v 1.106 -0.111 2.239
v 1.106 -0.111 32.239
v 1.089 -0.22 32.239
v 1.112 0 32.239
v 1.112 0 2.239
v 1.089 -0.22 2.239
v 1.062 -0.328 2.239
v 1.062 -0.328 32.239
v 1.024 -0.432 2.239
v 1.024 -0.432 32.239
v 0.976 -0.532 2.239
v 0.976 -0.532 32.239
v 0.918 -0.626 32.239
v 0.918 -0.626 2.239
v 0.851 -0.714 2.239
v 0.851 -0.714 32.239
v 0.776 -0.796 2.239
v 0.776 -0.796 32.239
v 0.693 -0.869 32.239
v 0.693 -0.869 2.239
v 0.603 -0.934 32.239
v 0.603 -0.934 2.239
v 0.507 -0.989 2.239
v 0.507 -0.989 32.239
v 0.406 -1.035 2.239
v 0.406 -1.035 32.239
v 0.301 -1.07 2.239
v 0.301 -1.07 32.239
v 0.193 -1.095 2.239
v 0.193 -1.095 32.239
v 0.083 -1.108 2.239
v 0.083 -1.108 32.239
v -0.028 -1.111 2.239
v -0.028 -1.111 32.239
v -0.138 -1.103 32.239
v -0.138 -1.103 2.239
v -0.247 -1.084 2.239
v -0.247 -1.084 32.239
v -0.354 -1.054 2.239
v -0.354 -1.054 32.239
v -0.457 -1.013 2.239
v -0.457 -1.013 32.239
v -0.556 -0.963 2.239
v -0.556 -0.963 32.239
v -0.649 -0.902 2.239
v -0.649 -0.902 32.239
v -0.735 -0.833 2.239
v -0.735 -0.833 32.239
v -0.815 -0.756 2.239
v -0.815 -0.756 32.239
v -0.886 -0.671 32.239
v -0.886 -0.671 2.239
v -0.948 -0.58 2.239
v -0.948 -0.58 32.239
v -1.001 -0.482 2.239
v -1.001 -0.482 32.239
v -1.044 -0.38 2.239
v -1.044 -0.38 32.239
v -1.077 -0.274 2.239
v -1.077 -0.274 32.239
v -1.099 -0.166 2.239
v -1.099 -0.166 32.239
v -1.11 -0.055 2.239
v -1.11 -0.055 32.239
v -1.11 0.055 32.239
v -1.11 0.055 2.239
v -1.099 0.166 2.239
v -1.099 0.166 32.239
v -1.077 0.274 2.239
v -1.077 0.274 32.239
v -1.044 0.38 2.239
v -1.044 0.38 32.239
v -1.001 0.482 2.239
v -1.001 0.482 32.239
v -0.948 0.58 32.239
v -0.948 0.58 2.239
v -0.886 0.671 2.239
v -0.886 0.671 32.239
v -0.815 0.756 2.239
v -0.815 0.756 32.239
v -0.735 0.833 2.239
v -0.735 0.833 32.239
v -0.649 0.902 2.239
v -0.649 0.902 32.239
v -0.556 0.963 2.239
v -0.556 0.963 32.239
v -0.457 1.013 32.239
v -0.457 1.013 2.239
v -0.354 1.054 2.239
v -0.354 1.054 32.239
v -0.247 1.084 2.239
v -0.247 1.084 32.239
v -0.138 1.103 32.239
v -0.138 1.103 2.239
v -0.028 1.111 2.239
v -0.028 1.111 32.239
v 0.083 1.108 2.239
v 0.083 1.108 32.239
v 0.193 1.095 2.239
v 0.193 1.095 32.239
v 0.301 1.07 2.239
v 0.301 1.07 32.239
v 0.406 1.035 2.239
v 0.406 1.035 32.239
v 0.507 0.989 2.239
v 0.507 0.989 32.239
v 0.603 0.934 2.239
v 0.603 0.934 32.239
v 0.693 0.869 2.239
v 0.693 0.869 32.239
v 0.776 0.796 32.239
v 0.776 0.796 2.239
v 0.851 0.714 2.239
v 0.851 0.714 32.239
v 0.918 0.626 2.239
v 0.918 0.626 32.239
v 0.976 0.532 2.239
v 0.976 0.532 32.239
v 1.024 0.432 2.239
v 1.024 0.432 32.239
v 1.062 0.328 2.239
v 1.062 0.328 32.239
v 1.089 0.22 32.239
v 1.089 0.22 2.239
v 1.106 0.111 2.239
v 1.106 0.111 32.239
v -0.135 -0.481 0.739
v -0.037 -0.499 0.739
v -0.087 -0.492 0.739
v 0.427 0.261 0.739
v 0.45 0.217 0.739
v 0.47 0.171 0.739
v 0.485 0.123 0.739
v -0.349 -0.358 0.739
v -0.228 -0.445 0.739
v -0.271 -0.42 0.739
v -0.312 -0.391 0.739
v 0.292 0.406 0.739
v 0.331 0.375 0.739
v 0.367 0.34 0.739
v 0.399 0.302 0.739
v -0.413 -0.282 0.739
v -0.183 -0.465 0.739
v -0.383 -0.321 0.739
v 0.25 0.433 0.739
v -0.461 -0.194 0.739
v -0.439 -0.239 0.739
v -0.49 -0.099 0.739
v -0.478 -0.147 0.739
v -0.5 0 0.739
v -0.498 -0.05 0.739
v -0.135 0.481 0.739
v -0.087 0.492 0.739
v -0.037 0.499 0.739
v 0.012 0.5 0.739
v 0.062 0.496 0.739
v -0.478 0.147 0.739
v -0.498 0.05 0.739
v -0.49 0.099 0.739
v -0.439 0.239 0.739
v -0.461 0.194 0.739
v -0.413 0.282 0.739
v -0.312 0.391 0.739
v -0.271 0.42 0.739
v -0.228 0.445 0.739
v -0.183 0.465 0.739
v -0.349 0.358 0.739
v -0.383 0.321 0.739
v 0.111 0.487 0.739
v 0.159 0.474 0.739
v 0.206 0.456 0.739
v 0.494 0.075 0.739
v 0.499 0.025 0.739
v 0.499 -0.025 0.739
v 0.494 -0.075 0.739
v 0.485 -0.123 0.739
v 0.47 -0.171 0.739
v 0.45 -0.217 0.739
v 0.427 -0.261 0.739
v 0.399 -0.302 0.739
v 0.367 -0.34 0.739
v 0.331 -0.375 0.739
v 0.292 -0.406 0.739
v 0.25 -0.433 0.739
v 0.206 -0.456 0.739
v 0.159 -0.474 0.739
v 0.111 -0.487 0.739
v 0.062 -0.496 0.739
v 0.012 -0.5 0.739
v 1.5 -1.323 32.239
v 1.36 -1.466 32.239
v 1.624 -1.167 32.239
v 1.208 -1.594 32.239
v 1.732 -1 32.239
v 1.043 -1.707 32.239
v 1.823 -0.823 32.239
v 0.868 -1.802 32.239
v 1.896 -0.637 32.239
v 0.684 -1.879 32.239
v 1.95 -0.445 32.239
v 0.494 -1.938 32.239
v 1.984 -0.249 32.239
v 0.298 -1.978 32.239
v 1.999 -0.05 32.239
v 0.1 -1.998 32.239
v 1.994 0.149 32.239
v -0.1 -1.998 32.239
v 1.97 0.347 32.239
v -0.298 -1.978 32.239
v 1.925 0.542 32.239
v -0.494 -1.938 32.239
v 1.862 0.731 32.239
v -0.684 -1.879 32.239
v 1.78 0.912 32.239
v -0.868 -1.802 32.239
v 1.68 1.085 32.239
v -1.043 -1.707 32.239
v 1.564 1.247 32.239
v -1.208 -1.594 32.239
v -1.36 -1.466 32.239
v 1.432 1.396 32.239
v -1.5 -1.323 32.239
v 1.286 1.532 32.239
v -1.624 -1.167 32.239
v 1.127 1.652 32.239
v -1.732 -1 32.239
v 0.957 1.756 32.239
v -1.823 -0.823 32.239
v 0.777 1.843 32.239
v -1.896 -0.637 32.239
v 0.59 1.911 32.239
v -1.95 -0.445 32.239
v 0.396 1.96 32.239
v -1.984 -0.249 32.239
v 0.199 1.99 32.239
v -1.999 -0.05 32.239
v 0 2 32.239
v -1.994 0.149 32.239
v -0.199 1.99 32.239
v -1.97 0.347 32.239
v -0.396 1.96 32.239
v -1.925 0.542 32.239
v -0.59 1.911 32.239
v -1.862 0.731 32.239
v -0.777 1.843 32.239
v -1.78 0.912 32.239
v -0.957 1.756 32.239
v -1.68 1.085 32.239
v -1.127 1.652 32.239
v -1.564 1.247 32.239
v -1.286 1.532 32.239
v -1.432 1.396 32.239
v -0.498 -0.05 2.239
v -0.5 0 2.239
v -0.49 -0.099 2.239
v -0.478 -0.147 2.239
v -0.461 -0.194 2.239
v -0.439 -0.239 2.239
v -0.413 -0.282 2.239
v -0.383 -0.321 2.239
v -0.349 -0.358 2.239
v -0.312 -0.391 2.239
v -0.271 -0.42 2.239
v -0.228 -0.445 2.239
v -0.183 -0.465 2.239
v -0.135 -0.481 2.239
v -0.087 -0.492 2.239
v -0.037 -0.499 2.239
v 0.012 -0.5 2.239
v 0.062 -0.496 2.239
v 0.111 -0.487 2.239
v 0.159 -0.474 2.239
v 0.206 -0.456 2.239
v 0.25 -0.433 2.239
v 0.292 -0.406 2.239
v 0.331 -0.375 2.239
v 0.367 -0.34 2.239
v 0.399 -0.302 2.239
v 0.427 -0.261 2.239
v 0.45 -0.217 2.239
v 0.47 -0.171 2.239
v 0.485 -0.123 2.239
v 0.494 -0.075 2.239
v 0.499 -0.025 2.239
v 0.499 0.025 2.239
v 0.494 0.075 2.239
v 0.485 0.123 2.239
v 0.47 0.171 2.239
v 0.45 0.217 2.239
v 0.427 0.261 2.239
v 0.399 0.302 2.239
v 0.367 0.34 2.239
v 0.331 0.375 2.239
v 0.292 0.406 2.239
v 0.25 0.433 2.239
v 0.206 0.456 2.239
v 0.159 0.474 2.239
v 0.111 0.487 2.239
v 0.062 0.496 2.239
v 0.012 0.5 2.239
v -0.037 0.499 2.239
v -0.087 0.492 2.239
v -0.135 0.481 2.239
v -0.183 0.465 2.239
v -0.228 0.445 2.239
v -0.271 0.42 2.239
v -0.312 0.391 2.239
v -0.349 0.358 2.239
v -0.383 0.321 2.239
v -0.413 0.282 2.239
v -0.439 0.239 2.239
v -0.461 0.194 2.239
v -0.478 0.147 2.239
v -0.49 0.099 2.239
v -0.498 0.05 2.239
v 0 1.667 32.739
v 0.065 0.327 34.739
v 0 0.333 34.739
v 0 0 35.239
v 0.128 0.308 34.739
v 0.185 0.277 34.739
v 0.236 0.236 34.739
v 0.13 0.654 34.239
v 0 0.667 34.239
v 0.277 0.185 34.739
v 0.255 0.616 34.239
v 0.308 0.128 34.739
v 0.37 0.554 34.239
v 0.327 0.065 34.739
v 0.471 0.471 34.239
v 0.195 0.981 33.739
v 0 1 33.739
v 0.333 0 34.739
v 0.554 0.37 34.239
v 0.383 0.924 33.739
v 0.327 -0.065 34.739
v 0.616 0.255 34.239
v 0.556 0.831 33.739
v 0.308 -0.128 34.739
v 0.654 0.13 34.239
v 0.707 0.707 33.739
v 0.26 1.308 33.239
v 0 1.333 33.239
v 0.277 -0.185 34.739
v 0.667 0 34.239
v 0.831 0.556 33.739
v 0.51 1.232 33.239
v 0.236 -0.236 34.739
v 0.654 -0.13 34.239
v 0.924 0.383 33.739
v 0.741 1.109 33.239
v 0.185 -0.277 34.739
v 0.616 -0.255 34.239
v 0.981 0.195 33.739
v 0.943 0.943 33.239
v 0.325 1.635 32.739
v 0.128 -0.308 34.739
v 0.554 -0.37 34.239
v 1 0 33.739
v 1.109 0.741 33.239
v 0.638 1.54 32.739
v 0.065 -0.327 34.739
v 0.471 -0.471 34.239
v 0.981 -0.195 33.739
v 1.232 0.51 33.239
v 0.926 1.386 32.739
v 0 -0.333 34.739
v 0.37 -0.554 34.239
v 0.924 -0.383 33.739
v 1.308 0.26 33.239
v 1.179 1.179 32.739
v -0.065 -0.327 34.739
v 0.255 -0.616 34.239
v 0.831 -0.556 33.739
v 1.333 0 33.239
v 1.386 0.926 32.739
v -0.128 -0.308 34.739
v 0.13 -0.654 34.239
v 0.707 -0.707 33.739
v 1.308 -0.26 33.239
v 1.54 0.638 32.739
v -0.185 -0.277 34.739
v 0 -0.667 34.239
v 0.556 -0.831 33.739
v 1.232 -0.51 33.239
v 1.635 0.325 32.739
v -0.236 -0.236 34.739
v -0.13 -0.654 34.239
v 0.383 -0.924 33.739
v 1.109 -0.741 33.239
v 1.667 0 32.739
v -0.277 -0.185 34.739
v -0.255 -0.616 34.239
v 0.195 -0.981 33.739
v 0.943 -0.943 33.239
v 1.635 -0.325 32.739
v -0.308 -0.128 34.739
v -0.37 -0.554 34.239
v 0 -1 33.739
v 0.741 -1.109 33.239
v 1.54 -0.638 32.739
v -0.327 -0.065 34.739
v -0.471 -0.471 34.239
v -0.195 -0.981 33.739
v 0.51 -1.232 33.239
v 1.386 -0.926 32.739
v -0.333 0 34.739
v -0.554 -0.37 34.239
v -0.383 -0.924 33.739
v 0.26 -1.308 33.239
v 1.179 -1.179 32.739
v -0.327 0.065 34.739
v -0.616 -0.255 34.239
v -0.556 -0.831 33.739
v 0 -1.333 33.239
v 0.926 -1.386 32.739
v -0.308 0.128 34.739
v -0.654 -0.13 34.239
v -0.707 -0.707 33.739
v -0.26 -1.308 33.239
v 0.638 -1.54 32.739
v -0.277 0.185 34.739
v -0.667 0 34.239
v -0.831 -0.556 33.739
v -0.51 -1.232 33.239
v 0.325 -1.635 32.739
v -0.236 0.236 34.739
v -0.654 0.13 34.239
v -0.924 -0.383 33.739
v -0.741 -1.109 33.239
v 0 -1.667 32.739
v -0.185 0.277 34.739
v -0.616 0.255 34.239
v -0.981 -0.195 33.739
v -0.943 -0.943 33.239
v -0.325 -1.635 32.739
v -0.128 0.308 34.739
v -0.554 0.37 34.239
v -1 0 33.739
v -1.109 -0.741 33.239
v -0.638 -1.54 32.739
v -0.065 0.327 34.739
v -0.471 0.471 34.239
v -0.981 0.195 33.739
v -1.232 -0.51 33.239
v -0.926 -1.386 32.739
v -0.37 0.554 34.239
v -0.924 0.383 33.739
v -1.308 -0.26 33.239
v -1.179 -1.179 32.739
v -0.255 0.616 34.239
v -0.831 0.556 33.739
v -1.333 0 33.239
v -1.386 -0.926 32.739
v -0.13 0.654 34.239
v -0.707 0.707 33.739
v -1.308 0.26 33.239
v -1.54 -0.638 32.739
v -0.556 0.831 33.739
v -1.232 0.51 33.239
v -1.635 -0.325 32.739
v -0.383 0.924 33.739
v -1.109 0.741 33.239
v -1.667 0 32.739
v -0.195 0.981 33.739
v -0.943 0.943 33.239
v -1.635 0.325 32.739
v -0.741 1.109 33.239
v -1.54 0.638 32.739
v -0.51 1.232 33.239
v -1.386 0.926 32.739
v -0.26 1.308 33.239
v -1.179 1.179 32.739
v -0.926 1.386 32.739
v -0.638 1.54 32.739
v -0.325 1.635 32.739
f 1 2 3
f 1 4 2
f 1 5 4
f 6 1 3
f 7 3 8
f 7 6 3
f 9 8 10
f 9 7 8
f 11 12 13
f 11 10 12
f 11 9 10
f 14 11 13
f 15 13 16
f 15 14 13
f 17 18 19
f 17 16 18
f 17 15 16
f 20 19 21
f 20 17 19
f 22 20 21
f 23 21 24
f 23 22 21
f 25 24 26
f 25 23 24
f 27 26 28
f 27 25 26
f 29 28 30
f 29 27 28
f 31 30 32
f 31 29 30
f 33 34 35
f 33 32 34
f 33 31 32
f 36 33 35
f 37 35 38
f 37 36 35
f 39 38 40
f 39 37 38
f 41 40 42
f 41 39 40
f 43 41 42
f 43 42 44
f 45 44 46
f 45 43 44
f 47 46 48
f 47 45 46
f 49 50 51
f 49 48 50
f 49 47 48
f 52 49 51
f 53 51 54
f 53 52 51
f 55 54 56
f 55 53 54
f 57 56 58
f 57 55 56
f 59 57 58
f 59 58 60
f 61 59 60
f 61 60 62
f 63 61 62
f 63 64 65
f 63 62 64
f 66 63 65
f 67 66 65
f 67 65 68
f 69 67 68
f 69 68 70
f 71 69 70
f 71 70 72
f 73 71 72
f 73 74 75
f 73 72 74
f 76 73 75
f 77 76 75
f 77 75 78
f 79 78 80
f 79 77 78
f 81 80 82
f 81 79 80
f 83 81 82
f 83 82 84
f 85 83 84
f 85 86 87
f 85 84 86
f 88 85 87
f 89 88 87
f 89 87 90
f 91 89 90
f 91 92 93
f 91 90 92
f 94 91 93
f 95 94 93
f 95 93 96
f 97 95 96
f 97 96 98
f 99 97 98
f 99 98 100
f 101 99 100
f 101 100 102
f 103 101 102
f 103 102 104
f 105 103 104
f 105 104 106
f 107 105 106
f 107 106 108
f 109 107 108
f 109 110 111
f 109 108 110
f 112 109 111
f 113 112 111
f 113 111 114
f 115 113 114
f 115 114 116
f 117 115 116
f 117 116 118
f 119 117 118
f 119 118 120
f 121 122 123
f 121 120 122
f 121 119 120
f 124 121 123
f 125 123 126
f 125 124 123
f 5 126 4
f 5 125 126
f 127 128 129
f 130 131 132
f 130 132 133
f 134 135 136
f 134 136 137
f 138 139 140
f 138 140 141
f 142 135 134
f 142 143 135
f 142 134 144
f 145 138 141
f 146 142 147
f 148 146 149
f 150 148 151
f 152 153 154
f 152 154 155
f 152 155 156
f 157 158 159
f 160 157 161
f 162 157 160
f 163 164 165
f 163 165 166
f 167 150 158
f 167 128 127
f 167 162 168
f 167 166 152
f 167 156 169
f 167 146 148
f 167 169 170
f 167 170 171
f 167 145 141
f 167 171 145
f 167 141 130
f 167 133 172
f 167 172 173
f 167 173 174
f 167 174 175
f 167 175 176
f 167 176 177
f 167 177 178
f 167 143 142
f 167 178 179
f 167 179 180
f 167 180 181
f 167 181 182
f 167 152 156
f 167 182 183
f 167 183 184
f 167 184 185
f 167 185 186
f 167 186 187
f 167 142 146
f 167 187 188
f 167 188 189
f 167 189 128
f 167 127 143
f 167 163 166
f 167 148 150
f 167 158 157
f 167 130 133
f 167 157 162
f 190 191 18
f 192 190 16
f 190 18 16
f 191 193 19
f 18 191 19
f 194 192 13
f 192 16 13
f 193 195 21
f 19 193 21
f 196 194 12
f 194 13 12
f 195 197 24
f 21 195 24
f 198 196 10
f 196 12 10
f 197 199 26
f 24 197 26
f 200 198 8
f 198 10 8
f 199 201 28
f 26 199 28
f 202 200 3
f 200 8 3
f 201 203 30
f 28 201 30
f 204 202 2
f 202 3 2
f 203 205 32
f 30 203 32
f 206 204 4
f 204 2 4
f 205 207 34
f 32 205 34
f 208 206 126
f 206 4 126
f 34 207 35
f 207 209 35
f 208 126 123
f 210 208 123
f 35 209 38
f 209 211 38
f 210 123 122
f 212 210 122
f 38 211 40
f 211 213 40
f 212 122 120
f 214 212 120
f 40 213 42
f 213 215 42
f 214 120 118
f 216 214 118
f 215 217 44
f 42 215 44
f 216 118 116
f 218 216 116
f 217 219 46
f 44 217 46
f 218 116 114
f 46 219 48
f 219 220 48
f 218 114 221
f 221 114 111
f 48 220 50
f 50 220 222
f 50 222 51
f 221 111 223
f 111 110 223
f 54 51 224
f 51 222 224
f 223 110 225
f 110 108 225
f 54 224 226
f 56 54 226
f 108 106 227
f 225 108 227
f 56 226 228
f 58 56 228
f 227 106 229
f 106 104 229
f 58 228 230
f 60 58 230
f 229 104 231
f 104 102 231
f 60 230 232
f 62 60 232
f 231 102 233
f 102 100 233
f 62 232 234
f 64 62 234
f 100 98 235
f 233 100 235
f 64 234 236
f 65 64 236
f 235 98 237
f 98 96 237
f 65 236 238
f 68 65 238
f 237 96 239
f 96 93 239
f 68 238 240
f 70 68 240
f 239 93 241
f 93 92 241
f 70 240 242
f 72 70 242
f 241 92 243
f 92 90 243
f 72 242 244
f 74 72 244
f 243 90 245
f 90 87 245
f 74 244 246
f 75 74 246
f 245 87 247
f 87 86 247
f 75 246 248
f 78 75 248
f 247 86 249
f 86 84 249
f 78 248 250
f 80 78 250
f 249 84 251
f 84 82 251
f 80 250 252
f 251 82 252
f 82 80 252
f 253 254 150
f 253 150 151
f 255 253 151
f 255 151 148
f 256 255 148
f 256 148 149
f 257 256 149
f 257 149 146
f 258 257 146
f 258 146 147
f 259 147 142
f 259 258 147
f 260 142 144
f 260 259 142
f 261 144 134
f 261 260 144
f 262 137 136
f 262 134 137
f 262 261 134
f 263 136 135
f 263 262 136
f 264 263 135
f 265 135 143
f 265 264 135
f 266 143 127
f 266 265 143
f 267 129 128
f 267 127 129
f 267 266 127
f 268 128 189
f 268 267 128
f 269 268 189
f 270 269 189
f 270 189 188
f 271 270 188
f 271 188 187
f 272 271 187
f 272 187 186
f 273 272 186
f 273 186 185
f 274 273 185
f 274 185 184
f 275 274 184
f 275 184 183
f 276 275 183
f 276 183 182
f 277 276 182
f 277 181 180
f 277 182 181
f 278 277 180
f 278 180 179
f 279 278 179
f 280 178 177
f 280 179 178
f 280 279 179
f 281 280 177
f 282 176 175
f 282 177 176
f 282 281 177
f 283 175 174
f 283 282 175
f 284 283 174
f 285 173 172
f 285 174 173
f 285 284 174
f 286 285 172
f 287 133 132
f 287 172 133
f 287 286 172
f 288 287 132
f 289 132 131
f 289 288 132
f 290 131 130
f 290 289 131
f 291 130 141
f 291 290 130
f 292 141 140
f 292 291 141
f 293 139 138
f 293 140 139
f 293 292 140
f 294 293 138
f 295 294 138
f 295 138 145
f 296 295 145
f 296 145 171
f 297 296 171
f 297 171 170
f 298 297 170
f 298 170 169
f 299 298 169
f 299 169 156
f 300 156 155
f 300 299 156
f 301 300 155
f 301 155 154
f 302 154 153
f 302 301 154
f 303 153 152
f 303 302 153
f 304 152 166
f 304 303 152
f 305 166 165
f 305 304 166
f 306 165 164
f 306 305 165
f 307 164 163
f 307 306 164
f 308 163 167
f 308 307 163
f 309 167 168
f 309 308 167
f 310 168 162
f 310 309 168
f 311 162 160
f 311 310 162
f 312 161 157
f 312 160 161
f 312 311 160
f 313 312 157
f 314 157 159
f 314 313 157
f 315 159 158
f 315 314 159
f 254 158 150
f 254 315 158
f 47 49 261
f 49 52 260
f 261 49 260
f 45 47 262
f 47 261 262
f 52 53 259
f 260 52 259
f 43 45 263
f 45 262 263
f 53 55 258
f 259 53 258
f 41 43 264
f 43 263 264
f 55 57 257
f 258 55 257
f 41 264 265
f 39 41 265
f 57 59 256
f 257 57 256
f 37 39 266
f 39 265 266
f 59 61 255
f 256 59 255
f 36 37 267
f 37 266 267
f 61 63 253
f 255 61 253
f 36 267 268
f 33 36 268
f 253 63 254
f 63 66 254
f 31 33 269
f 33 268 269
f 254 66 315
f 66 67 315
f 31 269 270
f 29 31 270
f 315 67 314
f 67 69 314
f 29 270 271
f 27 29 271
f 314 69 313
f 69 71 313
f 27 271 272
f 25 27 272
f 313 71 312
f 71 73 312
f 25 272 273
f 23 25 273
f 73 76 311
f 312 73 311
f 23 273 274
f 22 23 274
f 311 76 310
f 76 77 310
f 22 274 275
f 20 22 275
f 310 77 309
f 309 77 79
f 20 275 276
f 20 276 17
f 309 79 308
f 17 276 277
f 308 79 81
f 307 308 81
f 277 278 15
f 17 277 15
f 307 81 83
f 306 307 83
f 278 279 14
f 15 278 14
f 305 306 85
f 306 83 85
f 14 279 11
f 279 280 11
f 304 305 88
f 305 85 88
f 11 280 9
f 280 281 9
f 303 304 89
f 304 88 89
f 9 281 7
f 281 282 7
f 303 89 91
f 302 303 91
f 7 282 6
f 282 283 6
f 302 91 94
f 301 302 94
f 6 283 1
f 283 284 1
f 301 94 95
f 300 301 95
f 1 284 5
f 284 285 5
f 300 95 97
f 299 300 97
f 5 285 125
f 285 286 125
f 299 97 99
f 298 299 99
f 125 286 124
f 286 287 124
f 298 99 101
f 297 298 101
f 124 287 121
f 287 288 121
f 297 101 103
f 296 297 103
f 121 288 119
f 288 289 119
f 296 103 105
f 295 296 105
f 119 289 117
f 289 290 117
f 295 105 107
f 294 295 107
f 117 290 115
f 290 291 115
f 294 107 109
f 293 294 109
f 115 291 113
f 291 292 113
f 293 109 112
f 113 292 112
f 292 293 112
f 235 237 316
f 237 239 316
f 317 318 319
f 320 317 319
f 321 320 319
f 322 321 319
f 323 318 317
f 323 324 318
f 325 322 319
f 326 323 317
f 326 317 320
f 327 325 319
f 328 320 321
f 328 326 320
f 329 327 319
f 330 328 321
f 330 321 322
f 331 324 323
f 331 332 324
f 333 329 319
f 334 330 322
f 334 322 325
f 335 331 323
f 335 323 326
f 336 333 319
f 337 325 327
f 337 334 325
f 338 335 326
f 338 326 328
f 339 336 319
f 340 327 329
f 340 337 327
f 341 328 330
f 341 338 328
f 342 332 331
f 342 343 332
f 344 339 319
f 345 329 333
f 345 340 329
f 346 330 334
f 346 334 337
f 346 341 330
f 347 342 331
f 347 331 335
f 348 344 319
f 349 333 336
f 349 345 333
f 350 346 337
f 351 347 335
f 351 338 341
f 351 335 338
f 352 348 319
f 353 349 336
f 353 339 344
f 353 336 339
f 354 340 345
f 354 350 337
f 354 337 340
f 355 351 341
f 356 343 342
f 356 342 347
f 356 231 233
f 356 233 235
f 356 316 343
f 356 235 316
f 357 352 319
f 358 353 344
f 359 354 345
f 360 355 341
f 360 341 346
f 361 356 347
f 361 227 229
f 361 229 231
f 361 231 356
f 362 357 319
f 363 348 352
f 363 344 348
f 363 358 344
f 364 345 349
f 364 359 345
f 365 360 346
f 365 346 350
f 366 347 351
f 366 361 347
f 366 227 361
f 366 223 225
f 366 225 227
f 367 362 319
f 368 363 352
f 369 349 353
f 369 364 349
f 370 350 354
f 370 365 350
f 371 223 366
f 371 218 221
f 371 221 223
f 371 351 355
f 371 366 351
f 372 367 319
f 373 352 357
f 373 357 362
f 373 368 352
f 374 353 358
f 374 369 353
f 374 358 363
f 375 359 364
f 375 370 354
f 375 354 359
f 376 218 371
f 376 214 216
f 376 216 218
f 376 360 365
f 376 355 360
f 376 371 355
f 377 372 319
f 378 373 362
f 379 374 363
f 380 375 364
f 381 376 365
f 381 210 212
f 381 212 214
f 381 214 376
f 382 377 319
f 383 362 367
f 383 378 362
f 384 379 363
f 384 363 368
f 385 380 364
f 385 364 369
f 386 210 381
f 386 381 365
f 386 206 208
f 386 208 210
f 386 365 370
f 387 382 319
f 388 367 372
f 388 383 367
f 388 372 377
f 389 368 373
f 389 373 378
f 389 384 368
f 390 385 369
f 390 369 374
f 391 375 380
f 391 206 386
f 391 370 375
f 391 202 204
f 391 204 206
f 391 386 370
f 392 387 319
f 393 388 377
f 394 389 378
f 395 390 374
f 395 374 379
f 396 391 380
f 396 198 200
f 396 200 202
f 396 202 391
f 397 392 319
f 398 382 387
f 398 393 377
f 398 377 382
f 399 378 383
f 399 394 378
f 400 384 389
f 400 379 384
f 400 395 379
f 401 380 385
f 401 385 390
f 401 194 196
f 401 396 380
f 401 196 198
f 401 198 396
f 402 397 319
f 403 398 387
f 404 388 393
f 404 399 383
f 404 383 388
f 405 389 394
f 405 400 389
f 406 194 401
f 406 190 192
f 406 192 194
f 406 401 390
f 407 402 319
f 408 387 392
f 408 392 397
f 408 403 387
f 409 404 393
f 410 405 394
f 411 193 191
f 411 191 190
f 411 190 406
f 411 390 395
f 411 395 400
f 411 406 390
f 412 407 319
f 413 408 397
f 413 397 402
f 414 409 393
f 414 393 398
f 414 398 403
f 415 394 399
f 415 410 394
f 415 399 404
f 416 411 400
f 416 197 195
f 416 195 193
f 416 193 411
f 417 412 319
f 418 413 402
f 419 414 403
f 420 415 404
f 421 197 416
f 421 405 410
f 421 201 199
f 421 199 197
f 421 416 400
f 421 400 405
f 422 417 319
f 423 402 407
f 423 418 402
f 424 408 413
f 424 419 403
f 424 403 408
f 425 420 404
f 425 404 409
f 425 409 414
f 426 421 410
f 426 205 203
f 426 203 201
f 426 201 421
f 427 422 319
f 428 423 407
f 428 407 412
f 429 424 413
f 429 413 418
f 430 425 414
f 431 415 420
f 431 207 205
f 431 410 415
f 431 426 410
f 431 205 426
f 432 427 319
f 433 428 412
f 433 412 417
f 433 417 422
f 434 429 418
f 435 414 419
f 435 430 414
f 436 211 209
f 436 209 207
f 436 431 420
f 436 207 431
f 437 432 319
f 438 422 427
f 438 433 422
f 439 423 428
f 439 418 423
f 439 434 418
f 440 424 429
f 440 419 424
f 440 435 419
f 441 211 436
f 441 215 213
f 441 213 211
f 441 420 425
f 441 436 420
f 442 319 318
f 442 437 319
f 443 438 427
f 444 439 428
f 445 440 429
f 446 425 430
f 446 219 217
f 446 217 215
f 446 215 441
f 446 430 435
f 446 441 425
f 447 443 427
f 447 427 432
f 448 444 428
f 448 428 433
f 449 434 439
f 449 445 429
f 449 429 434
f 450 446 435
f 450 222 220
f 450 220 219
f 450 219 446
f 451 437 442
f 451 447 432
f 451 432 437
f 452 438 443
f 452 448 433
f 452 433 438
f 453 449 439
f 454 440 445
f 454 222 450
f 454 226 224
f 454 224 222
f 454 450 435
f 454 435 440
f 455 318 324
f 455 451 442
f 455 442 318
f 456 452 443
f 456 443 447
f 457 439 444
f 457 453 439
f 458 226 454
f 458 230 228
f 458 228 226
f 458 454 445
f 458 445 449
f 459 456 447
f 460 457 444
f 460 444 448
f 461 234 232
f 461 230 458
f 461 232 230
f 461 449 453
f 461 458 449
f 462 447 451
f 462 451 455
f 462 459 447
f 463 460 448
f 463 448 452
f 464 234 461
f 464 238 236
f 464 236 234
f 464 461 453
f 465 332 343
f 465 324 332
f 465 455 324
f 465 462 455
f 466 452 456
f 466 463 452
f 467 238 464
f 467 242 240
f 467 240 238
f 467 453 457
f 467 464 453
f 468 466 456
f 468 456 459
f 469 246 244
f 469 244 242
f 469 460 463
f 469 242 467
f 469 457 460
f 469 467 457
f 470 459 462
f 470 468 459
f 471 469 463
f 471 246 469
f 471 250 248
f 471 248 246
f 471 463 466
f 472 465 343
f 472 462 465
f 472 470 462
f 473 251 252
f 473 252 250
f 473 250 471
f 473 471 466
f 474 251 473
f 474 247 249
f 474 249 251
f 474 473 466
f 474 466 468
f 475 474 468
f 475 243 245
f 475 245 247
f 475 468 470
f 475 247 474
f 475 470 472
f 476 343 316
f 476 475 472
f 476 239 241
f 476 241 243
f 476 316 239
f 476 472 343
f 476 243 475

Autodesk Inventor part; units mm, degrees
ref_plane "Arbeitsebene1" through (0, 0, 0) normal (-1, 0, 0) x (0, -1, 0)
ref_plane "Arbeitsebene7" through (0, 0, 2.2393) normal (0, 0, 1) x (1, 0, 0)
sketch "Skizze6" plane through (0, 0, 2.2393) normal (0, 0, 1) x (1, 0, 0)
  circle A0 centre (0, 0) radius 1.1115
extrude "Extrusion6" add sketch "Skizze6" along normal blind 30
ref_plane "Arbeitsebene10" through (0, 0, 32.2393) normal (-1, 0, 0) x (0, 0, 1)
sketch "Skizze8" plane through (0, 0, 32.2393) normal (-1, 0, 0) x (0, 0, 1)
  line L0 (0, 0) -> (3, 0)
  line L1 (0, 0) -> (0, 2)
  line L2 (0, 2) -> (3, 0)
  line L3 (-42.2872, 0) -> (10.5479, 0) projected
  point P0 (-32.2393, 0)
  dimension "d17" = 3
  dimension "d18" = 2
revolve "Umdrehung2" add sketch "Skizze8" angle 360 about axis through (0, 0, 32.2393) along (0, 0, 1)
sketch "Skizze11" plane through (0, 0, 2.2393) normal (0, 0, -1) x (-1, 0, 0)
  circle A0 centre (0, 0) radius 0.5
  dimension "d26" = 1
extrude "Extrusion7" add sketch "Skizze11" along normal blind 1.5
properties part number "xyz_Axis_with_ball_Axis"
